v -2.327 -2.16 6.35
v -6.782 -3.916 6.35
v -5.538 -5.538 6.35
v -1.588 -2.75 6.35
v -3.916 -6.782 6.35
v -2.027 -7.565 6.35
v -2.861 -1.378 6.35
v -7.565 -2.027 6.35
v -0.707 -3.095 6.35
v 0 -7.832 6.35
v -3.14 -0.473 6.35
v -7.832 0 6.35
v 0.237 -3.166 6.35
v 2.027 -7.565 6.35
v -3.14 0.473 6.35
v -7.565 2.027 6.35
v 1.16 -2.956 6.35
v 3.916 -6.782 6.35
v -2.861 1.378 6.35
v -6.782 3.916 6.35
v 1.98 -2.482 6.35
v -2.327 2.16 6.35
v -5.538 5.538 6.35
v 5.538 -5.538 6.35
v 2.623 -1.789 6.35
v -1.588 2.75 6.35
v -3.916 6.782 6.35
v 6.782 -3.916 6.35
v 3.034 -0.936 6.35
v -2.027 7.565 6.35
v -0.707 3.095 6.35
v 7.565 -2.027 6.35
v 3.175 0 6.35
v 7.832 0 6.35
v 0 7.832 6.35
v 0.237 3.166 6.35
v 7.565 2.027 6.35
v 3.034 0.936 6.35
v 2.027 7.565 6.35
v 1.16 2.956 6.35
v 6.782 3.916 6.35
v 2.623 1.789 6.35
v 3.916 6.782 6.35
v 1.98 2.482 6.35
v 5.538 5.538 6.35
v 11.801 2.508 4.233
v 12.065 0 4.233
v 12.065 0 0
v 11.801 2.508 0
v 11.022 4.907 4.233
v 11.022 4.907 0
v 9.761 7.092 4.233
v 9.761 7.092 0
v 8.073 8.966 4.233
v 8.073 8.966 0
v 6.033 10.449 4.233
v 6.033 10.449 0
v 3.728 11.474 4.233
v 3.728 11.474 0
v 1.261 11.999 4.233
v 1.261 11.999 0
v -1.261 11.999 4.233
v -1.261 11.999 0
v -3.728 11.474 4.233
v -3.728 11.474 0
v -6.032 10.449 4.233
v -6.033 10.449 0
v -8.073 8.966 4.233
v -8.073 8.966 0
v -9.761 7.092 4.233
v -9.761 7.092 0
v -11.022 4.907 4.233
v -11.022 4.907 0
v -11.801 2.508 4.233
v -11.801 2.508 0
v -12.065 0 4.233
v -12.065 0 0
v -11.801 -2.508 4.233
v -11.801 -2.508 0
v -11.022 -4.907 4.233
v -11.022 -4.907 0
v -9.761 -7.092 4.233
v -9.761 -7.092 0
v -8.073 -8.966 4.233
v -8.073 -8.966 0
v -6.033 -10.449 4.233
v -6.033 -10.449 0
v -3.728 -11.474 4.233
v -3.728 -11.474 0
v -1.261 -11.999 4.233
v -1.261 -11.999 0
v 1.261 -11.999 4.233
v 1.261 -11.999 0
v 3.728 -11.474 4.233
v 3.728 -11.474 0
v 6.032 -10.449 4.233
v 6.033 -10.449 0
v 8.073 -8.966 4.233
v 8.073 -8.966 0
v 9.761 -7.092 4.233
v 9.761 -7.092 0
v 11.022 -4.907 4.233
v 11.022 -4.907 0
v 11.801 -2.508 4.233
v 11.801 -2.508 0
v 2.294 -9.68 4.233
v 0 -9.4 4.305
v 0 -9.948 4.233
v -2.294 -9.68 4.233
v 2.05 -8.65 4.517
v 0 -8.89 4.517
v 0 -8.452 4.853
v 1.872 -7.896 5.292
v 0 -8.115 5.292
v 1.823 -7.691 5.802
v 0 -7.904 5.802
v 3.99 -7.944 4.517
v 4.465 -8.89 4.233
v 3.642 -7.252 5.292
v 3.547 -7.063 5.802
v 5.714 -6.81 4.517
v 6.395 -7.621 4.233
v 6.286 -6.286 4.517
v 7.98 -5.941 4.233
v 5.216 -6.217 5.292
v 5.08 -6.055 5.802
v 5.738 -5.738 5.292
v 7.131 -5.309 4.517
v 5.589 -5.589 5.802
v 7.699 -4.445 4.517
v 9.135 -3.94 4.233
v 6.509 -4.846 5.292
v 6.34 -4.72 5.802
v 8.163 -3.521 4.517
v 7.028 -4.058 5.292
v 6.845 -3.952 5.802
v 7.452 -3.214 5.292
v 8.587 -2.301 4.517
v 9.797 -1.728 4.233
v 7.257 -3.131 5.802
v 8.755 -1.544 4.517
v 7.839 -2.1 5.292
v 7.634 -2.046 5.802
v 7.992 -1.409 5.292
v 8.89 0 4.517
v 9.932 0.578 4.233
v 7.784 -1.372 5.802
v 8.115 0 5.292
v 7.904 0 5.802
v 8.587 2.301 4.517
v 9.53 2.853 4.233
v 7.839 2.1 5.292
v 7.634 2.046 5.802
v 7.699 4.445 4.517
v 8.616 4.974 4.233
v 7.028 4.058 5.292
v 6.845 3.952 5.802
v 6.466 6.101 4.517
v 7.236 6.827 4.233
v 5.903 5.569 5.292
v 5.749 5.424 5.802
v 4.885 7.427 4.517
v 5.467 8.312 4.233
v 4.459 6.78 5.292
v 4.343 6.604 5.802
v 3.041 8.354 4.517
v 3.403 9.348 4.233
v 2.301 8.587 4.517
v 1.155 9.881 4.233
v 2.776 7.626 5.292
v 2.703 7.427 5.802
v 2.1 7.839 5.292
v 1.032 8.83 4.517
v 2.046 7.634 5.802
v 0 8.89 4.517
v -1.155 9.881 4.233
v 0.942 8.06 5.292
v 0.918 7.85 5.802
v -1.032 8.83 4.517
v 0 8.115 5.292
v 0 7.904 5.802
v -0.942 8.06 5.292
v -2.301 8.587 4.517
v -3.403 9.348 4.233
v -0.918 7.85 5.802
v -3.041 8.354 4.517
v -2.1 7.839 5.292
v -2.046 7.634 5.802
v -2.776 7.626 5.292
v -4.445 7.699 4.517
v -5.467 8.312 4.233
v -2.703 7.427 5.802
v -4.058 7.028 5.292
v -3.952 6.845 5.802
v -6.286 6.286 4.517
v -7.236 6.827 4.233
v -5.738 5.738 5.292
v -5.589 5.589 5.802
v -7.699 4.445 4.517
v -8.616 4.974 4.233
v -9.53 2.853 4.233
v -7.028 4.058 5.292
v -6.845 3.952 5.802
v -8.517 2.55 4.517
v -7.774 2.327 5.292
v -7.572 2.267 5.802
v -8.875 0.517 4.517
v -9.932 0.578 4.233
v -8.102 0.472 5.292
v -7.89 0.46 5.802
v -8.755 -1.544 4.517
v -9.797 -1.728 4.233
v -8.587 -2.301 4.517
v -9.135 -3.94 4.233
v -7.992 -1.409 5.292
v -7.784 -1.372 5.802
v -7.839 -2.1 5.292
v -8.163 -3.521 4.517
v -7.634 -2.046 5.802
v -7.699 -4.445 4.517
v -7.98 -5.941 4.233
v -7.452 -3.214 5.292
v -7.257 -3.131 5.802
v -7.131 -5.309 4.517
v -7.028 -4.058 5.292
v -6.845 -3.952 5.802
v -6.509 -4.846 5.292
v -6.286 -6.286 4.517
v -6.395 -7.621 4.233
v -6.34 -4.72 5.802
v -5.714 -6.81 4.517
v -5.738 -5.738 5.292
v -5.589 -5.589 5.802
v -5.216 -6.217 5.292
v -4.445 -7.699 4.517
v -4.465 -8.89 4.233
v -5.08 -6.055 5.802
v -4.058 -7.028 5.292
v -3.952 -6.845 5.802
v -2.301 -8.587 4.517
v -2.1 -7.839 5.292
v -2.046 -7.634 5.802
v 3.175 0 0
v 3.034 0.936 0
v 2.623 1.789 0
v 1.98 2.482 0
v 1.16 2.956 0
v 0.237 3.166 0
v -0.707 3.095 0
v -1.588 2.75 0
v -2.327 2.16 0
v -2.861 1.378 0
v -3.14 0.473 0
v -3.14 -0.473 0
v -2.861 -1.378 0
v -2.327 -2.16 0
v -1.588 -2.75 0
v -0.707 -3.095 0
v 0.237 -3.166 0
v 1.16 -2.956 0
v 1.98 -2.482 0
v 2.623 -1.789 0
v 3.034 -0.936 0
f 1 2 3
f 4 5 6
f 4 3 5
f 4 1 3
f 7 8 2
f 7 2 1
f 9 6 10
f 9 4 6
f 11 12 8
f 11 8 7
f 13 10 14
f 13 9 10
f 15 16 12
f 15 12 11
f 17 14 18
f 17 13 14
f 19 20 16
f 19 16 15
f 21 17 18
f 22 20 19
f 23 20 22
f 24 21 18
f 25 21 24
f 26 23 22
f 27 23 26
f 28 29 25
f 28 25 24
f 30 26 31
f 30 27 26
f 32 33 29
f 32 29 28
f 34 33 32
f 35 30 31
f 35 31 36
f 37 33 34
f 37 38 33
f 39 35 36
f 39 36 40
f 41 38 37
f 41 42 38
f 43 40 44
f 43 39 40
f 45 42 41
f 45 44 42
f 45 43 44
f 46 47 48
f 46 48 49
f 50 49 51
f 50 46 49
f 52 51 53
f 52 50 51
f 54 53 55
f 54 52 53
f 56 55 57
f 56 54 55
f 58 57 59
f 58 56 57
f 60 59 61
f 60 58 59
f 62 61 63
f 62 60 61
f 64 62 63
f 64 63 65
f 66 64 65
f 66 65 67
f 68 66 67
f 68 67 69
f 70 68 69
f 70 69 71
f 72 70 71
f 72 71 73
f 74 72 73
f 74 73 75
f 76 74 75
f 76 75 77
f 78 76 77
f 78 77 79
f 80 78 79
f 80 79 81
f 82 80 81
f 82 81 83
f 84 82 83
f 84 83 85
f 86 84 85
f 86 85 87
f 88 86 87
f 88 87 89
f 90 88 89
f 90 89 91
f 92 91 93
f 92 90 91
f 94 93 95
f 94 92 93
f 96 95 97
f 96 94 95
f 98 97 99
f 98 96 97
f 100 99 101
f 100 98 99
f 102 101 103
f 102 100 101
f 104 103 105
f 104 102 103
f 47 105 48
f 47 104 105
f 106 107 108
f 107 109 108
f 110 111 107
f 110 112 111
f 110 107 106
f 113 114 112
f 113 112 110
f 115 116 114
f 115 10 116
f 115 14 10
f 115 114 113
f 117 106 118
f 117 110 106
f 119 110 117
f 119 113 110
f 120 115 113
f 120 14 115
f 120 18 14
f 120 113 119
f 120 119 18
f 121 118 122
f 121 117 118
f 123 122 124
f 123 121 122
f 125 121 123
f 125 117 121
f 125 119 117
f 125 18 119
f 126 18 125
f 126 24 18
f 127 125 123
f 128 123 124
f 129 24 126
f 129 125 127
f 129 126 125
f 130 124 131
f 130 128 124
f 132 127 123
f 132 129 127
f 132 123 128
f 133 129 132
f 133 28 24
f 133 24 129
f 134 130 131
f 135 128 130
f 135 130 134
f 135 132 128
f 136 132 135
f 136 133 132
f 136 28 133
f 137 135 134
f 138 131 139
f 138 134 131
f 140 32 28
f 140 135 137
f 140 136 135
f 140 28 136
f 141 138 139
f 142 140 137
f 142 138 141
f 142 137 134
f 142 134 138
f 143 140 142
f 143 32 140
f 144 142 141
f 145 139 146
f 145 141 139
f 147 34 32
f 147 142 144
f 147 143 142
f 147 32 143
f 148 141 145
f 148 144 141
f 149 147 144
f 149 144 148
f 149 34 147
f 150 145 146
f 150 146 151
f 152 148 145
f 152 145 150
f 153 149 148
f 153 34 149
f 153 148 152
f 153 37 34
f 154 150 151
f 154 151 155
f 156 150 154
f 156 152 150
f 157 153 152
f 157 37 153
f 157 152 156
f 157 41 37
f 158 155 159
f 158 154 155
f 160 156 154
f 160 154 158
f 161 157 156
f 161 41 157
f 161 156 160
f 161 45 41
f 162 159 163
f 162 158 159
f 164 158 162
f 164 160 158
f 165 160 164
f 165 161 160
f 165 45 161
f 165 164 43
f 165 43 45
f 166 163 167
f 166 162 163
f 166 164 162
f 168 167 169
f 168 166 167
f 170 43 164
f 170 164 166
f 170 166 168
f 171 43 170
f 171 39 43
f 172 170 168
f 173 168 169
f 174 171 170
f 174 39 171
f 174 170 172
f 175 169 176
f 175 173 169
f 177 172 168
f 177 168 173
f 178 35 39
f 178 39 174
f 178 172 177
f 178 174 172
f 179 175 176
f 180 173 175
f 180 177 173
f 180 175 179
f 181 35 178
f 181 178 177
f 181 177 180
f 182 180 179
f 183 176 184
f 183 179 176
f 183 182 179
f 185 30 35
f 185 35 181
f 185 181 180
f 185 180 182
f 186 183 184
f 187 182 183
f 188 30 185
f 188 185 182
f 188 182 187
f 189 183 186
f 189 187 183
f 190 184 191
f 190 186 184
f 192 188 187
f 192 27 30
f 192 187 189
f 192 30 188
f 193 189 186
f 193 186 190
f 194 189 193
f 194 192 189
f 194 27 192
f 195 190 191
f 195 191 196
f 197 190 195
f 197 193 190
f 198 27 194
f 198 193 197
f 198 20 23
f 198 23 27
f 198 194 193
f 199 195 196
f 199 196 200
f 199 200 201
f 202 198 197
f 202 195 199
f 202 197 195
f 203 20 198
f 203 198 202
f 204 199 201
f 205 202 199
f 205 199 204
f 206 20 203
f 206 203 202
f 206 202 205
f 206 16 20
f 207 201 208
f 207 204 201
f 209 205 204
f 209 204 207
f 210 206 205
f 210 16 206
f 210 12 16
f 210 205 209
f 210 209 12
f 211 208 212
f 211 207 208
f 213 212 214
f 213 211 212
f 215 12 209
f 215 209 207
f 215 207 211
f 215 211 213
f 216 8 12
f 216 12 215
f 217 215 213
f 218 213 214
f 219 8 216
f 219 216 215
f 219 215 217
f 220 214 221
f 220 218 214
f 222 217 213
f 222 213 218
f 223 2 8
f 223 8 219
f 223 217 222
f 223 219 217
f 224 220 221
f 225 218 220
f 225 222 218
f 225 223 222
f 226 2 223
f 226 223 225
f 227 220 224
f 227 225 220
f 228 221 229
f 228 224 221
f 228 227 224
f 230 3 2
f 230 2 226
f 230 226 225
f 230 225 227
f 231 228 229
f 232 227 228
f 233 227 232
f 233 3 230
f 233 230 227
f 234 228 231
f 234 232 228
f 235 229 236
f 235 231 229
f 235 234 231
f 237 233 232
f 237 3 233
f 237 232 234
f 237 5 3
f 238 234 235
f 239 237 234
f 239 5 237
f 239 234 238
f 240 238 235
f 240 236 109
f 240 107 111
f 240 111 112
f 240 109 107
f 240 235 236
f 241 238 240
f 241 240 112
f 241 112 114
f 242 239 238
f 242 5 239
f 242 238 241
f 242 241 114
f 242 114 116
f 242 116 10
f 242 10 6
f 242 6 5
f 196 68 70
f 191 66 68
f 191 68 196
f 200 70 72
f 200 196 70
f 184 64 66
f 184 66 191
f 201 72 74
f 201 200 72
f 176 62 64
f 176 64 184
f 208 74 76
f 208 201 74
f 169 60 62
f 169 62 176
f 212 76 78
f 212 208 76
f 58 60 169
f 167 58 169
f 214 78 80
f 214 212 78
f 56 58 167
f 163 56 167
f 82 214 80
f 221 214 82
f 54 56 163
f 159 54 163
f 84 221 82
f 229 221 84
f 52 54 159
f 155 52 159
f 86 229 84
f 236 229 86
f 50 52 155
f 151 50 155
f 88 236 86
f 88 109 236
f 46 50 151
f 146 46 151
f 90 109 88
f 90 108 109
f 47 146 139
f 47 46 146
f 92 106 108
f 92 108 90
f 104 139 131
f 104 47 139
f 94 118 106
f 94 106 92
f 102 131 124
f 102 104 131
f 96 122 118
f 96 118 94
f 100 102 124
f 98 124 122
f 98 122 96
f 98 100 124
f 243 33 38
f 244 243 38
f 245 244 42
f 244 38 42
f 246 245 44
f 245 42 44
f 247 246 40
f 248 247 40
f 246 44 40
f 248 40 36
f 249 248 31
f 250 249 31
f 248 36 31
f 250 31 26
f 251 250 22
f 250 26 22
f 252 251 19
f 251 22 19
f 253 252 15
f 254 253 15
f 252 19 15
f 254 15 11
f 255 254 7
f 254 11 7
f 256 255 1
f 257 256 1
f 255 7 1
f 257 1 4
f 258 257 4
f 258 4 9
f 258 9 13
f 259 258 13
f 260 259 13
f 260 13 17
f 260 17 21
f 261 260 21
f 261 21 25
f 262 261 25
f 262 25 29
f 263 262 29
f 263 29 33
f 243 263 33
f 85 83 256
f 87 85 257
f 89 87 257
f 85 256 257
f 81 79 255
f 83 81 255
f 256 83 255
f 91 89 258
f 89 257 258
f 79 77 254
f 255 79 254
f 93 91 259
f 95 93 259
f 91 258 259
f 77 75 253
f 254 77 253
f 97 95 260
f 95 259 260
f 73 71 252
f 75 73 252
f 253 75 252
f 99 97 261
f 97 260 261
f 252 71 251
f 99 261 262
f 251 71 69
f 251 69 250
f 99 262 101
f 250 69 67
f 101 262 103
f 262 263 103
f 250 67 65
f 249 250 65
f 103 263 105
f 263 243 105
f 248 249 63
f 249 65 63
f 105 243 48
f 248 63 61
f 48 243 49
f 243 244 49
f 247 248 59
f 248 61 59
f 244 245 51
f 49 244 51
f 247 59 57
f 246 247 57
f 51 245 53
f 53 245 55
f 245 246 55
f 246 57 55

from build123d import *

# Parameters (mm, degrees)
F0_R      = 15.875
F1_DEPTH  = 12.7
F5_R      = 3.175
F6_DEPTH  = 12.701
F7_R      = 20.024716
F7_R_2    = 12.065
F8_DEPTH  = 12.701
F10_R     = 20.449892
F10_R_2   = 1.769063
F11_DEPTH = 6.35


with BuildPart() as f1:
    # F0 (on Top) → F1 (new body)
    with BuildSketch(Plane.XY):
        Circle(F0_R)
    extrude(amount=F1_DEPTH)

    # F2 (on Right) → F4 (revolve, cut)
    with BuildSketch(Plane.YZ):
        with BuildLine():
            Line((-12.065, 8.466667), (-12.065, 4.233333))
            Line((-12.065, 4.233333), (-9.948333, 4.233333))
            ThreePointArc((-9.948333, 4.233333), (-7.831667, 6.35), (-9.948333, 8.466667))
            Line((-9.948333, 8.466667), (-12.065, 8.466667))
        make_face()
    revolve(axis=Axis((0, 0, 11.412669), (0, 0, 1)), mode=Mode.SUBTRACT)

    # F5 (on face) → F6 (cut, through all)
    with BuildSketch(Plane.XY.offset(12.7)):
        Circle(F5_R)
    extrude(amount=-F6_DEPTH, mode=Mode.SUBTRACT)

    # F7 (on face) → F8 (cut, through all)
    with BuildSketch(Plane.XY.offset(12.7)):
        Circle(F7_R)
        Circle(F7_R_2, mode=Mode.SUBTRACT)
    extrude(amount=-F8_DEPTH, mode=Mode.SUBTRACT)

    # F10 (on face) → F11 (cut, through all)
    with BuildSketch(Plane.XY.offset(12.7)):
        Circle(F10_R)
        Circle(F10_R_2, mode=Mode.SUBTRACT)
    extrude(amount=-F11_DEPTH, mode=Mode.SUBTRACT)


solid = f1.part
